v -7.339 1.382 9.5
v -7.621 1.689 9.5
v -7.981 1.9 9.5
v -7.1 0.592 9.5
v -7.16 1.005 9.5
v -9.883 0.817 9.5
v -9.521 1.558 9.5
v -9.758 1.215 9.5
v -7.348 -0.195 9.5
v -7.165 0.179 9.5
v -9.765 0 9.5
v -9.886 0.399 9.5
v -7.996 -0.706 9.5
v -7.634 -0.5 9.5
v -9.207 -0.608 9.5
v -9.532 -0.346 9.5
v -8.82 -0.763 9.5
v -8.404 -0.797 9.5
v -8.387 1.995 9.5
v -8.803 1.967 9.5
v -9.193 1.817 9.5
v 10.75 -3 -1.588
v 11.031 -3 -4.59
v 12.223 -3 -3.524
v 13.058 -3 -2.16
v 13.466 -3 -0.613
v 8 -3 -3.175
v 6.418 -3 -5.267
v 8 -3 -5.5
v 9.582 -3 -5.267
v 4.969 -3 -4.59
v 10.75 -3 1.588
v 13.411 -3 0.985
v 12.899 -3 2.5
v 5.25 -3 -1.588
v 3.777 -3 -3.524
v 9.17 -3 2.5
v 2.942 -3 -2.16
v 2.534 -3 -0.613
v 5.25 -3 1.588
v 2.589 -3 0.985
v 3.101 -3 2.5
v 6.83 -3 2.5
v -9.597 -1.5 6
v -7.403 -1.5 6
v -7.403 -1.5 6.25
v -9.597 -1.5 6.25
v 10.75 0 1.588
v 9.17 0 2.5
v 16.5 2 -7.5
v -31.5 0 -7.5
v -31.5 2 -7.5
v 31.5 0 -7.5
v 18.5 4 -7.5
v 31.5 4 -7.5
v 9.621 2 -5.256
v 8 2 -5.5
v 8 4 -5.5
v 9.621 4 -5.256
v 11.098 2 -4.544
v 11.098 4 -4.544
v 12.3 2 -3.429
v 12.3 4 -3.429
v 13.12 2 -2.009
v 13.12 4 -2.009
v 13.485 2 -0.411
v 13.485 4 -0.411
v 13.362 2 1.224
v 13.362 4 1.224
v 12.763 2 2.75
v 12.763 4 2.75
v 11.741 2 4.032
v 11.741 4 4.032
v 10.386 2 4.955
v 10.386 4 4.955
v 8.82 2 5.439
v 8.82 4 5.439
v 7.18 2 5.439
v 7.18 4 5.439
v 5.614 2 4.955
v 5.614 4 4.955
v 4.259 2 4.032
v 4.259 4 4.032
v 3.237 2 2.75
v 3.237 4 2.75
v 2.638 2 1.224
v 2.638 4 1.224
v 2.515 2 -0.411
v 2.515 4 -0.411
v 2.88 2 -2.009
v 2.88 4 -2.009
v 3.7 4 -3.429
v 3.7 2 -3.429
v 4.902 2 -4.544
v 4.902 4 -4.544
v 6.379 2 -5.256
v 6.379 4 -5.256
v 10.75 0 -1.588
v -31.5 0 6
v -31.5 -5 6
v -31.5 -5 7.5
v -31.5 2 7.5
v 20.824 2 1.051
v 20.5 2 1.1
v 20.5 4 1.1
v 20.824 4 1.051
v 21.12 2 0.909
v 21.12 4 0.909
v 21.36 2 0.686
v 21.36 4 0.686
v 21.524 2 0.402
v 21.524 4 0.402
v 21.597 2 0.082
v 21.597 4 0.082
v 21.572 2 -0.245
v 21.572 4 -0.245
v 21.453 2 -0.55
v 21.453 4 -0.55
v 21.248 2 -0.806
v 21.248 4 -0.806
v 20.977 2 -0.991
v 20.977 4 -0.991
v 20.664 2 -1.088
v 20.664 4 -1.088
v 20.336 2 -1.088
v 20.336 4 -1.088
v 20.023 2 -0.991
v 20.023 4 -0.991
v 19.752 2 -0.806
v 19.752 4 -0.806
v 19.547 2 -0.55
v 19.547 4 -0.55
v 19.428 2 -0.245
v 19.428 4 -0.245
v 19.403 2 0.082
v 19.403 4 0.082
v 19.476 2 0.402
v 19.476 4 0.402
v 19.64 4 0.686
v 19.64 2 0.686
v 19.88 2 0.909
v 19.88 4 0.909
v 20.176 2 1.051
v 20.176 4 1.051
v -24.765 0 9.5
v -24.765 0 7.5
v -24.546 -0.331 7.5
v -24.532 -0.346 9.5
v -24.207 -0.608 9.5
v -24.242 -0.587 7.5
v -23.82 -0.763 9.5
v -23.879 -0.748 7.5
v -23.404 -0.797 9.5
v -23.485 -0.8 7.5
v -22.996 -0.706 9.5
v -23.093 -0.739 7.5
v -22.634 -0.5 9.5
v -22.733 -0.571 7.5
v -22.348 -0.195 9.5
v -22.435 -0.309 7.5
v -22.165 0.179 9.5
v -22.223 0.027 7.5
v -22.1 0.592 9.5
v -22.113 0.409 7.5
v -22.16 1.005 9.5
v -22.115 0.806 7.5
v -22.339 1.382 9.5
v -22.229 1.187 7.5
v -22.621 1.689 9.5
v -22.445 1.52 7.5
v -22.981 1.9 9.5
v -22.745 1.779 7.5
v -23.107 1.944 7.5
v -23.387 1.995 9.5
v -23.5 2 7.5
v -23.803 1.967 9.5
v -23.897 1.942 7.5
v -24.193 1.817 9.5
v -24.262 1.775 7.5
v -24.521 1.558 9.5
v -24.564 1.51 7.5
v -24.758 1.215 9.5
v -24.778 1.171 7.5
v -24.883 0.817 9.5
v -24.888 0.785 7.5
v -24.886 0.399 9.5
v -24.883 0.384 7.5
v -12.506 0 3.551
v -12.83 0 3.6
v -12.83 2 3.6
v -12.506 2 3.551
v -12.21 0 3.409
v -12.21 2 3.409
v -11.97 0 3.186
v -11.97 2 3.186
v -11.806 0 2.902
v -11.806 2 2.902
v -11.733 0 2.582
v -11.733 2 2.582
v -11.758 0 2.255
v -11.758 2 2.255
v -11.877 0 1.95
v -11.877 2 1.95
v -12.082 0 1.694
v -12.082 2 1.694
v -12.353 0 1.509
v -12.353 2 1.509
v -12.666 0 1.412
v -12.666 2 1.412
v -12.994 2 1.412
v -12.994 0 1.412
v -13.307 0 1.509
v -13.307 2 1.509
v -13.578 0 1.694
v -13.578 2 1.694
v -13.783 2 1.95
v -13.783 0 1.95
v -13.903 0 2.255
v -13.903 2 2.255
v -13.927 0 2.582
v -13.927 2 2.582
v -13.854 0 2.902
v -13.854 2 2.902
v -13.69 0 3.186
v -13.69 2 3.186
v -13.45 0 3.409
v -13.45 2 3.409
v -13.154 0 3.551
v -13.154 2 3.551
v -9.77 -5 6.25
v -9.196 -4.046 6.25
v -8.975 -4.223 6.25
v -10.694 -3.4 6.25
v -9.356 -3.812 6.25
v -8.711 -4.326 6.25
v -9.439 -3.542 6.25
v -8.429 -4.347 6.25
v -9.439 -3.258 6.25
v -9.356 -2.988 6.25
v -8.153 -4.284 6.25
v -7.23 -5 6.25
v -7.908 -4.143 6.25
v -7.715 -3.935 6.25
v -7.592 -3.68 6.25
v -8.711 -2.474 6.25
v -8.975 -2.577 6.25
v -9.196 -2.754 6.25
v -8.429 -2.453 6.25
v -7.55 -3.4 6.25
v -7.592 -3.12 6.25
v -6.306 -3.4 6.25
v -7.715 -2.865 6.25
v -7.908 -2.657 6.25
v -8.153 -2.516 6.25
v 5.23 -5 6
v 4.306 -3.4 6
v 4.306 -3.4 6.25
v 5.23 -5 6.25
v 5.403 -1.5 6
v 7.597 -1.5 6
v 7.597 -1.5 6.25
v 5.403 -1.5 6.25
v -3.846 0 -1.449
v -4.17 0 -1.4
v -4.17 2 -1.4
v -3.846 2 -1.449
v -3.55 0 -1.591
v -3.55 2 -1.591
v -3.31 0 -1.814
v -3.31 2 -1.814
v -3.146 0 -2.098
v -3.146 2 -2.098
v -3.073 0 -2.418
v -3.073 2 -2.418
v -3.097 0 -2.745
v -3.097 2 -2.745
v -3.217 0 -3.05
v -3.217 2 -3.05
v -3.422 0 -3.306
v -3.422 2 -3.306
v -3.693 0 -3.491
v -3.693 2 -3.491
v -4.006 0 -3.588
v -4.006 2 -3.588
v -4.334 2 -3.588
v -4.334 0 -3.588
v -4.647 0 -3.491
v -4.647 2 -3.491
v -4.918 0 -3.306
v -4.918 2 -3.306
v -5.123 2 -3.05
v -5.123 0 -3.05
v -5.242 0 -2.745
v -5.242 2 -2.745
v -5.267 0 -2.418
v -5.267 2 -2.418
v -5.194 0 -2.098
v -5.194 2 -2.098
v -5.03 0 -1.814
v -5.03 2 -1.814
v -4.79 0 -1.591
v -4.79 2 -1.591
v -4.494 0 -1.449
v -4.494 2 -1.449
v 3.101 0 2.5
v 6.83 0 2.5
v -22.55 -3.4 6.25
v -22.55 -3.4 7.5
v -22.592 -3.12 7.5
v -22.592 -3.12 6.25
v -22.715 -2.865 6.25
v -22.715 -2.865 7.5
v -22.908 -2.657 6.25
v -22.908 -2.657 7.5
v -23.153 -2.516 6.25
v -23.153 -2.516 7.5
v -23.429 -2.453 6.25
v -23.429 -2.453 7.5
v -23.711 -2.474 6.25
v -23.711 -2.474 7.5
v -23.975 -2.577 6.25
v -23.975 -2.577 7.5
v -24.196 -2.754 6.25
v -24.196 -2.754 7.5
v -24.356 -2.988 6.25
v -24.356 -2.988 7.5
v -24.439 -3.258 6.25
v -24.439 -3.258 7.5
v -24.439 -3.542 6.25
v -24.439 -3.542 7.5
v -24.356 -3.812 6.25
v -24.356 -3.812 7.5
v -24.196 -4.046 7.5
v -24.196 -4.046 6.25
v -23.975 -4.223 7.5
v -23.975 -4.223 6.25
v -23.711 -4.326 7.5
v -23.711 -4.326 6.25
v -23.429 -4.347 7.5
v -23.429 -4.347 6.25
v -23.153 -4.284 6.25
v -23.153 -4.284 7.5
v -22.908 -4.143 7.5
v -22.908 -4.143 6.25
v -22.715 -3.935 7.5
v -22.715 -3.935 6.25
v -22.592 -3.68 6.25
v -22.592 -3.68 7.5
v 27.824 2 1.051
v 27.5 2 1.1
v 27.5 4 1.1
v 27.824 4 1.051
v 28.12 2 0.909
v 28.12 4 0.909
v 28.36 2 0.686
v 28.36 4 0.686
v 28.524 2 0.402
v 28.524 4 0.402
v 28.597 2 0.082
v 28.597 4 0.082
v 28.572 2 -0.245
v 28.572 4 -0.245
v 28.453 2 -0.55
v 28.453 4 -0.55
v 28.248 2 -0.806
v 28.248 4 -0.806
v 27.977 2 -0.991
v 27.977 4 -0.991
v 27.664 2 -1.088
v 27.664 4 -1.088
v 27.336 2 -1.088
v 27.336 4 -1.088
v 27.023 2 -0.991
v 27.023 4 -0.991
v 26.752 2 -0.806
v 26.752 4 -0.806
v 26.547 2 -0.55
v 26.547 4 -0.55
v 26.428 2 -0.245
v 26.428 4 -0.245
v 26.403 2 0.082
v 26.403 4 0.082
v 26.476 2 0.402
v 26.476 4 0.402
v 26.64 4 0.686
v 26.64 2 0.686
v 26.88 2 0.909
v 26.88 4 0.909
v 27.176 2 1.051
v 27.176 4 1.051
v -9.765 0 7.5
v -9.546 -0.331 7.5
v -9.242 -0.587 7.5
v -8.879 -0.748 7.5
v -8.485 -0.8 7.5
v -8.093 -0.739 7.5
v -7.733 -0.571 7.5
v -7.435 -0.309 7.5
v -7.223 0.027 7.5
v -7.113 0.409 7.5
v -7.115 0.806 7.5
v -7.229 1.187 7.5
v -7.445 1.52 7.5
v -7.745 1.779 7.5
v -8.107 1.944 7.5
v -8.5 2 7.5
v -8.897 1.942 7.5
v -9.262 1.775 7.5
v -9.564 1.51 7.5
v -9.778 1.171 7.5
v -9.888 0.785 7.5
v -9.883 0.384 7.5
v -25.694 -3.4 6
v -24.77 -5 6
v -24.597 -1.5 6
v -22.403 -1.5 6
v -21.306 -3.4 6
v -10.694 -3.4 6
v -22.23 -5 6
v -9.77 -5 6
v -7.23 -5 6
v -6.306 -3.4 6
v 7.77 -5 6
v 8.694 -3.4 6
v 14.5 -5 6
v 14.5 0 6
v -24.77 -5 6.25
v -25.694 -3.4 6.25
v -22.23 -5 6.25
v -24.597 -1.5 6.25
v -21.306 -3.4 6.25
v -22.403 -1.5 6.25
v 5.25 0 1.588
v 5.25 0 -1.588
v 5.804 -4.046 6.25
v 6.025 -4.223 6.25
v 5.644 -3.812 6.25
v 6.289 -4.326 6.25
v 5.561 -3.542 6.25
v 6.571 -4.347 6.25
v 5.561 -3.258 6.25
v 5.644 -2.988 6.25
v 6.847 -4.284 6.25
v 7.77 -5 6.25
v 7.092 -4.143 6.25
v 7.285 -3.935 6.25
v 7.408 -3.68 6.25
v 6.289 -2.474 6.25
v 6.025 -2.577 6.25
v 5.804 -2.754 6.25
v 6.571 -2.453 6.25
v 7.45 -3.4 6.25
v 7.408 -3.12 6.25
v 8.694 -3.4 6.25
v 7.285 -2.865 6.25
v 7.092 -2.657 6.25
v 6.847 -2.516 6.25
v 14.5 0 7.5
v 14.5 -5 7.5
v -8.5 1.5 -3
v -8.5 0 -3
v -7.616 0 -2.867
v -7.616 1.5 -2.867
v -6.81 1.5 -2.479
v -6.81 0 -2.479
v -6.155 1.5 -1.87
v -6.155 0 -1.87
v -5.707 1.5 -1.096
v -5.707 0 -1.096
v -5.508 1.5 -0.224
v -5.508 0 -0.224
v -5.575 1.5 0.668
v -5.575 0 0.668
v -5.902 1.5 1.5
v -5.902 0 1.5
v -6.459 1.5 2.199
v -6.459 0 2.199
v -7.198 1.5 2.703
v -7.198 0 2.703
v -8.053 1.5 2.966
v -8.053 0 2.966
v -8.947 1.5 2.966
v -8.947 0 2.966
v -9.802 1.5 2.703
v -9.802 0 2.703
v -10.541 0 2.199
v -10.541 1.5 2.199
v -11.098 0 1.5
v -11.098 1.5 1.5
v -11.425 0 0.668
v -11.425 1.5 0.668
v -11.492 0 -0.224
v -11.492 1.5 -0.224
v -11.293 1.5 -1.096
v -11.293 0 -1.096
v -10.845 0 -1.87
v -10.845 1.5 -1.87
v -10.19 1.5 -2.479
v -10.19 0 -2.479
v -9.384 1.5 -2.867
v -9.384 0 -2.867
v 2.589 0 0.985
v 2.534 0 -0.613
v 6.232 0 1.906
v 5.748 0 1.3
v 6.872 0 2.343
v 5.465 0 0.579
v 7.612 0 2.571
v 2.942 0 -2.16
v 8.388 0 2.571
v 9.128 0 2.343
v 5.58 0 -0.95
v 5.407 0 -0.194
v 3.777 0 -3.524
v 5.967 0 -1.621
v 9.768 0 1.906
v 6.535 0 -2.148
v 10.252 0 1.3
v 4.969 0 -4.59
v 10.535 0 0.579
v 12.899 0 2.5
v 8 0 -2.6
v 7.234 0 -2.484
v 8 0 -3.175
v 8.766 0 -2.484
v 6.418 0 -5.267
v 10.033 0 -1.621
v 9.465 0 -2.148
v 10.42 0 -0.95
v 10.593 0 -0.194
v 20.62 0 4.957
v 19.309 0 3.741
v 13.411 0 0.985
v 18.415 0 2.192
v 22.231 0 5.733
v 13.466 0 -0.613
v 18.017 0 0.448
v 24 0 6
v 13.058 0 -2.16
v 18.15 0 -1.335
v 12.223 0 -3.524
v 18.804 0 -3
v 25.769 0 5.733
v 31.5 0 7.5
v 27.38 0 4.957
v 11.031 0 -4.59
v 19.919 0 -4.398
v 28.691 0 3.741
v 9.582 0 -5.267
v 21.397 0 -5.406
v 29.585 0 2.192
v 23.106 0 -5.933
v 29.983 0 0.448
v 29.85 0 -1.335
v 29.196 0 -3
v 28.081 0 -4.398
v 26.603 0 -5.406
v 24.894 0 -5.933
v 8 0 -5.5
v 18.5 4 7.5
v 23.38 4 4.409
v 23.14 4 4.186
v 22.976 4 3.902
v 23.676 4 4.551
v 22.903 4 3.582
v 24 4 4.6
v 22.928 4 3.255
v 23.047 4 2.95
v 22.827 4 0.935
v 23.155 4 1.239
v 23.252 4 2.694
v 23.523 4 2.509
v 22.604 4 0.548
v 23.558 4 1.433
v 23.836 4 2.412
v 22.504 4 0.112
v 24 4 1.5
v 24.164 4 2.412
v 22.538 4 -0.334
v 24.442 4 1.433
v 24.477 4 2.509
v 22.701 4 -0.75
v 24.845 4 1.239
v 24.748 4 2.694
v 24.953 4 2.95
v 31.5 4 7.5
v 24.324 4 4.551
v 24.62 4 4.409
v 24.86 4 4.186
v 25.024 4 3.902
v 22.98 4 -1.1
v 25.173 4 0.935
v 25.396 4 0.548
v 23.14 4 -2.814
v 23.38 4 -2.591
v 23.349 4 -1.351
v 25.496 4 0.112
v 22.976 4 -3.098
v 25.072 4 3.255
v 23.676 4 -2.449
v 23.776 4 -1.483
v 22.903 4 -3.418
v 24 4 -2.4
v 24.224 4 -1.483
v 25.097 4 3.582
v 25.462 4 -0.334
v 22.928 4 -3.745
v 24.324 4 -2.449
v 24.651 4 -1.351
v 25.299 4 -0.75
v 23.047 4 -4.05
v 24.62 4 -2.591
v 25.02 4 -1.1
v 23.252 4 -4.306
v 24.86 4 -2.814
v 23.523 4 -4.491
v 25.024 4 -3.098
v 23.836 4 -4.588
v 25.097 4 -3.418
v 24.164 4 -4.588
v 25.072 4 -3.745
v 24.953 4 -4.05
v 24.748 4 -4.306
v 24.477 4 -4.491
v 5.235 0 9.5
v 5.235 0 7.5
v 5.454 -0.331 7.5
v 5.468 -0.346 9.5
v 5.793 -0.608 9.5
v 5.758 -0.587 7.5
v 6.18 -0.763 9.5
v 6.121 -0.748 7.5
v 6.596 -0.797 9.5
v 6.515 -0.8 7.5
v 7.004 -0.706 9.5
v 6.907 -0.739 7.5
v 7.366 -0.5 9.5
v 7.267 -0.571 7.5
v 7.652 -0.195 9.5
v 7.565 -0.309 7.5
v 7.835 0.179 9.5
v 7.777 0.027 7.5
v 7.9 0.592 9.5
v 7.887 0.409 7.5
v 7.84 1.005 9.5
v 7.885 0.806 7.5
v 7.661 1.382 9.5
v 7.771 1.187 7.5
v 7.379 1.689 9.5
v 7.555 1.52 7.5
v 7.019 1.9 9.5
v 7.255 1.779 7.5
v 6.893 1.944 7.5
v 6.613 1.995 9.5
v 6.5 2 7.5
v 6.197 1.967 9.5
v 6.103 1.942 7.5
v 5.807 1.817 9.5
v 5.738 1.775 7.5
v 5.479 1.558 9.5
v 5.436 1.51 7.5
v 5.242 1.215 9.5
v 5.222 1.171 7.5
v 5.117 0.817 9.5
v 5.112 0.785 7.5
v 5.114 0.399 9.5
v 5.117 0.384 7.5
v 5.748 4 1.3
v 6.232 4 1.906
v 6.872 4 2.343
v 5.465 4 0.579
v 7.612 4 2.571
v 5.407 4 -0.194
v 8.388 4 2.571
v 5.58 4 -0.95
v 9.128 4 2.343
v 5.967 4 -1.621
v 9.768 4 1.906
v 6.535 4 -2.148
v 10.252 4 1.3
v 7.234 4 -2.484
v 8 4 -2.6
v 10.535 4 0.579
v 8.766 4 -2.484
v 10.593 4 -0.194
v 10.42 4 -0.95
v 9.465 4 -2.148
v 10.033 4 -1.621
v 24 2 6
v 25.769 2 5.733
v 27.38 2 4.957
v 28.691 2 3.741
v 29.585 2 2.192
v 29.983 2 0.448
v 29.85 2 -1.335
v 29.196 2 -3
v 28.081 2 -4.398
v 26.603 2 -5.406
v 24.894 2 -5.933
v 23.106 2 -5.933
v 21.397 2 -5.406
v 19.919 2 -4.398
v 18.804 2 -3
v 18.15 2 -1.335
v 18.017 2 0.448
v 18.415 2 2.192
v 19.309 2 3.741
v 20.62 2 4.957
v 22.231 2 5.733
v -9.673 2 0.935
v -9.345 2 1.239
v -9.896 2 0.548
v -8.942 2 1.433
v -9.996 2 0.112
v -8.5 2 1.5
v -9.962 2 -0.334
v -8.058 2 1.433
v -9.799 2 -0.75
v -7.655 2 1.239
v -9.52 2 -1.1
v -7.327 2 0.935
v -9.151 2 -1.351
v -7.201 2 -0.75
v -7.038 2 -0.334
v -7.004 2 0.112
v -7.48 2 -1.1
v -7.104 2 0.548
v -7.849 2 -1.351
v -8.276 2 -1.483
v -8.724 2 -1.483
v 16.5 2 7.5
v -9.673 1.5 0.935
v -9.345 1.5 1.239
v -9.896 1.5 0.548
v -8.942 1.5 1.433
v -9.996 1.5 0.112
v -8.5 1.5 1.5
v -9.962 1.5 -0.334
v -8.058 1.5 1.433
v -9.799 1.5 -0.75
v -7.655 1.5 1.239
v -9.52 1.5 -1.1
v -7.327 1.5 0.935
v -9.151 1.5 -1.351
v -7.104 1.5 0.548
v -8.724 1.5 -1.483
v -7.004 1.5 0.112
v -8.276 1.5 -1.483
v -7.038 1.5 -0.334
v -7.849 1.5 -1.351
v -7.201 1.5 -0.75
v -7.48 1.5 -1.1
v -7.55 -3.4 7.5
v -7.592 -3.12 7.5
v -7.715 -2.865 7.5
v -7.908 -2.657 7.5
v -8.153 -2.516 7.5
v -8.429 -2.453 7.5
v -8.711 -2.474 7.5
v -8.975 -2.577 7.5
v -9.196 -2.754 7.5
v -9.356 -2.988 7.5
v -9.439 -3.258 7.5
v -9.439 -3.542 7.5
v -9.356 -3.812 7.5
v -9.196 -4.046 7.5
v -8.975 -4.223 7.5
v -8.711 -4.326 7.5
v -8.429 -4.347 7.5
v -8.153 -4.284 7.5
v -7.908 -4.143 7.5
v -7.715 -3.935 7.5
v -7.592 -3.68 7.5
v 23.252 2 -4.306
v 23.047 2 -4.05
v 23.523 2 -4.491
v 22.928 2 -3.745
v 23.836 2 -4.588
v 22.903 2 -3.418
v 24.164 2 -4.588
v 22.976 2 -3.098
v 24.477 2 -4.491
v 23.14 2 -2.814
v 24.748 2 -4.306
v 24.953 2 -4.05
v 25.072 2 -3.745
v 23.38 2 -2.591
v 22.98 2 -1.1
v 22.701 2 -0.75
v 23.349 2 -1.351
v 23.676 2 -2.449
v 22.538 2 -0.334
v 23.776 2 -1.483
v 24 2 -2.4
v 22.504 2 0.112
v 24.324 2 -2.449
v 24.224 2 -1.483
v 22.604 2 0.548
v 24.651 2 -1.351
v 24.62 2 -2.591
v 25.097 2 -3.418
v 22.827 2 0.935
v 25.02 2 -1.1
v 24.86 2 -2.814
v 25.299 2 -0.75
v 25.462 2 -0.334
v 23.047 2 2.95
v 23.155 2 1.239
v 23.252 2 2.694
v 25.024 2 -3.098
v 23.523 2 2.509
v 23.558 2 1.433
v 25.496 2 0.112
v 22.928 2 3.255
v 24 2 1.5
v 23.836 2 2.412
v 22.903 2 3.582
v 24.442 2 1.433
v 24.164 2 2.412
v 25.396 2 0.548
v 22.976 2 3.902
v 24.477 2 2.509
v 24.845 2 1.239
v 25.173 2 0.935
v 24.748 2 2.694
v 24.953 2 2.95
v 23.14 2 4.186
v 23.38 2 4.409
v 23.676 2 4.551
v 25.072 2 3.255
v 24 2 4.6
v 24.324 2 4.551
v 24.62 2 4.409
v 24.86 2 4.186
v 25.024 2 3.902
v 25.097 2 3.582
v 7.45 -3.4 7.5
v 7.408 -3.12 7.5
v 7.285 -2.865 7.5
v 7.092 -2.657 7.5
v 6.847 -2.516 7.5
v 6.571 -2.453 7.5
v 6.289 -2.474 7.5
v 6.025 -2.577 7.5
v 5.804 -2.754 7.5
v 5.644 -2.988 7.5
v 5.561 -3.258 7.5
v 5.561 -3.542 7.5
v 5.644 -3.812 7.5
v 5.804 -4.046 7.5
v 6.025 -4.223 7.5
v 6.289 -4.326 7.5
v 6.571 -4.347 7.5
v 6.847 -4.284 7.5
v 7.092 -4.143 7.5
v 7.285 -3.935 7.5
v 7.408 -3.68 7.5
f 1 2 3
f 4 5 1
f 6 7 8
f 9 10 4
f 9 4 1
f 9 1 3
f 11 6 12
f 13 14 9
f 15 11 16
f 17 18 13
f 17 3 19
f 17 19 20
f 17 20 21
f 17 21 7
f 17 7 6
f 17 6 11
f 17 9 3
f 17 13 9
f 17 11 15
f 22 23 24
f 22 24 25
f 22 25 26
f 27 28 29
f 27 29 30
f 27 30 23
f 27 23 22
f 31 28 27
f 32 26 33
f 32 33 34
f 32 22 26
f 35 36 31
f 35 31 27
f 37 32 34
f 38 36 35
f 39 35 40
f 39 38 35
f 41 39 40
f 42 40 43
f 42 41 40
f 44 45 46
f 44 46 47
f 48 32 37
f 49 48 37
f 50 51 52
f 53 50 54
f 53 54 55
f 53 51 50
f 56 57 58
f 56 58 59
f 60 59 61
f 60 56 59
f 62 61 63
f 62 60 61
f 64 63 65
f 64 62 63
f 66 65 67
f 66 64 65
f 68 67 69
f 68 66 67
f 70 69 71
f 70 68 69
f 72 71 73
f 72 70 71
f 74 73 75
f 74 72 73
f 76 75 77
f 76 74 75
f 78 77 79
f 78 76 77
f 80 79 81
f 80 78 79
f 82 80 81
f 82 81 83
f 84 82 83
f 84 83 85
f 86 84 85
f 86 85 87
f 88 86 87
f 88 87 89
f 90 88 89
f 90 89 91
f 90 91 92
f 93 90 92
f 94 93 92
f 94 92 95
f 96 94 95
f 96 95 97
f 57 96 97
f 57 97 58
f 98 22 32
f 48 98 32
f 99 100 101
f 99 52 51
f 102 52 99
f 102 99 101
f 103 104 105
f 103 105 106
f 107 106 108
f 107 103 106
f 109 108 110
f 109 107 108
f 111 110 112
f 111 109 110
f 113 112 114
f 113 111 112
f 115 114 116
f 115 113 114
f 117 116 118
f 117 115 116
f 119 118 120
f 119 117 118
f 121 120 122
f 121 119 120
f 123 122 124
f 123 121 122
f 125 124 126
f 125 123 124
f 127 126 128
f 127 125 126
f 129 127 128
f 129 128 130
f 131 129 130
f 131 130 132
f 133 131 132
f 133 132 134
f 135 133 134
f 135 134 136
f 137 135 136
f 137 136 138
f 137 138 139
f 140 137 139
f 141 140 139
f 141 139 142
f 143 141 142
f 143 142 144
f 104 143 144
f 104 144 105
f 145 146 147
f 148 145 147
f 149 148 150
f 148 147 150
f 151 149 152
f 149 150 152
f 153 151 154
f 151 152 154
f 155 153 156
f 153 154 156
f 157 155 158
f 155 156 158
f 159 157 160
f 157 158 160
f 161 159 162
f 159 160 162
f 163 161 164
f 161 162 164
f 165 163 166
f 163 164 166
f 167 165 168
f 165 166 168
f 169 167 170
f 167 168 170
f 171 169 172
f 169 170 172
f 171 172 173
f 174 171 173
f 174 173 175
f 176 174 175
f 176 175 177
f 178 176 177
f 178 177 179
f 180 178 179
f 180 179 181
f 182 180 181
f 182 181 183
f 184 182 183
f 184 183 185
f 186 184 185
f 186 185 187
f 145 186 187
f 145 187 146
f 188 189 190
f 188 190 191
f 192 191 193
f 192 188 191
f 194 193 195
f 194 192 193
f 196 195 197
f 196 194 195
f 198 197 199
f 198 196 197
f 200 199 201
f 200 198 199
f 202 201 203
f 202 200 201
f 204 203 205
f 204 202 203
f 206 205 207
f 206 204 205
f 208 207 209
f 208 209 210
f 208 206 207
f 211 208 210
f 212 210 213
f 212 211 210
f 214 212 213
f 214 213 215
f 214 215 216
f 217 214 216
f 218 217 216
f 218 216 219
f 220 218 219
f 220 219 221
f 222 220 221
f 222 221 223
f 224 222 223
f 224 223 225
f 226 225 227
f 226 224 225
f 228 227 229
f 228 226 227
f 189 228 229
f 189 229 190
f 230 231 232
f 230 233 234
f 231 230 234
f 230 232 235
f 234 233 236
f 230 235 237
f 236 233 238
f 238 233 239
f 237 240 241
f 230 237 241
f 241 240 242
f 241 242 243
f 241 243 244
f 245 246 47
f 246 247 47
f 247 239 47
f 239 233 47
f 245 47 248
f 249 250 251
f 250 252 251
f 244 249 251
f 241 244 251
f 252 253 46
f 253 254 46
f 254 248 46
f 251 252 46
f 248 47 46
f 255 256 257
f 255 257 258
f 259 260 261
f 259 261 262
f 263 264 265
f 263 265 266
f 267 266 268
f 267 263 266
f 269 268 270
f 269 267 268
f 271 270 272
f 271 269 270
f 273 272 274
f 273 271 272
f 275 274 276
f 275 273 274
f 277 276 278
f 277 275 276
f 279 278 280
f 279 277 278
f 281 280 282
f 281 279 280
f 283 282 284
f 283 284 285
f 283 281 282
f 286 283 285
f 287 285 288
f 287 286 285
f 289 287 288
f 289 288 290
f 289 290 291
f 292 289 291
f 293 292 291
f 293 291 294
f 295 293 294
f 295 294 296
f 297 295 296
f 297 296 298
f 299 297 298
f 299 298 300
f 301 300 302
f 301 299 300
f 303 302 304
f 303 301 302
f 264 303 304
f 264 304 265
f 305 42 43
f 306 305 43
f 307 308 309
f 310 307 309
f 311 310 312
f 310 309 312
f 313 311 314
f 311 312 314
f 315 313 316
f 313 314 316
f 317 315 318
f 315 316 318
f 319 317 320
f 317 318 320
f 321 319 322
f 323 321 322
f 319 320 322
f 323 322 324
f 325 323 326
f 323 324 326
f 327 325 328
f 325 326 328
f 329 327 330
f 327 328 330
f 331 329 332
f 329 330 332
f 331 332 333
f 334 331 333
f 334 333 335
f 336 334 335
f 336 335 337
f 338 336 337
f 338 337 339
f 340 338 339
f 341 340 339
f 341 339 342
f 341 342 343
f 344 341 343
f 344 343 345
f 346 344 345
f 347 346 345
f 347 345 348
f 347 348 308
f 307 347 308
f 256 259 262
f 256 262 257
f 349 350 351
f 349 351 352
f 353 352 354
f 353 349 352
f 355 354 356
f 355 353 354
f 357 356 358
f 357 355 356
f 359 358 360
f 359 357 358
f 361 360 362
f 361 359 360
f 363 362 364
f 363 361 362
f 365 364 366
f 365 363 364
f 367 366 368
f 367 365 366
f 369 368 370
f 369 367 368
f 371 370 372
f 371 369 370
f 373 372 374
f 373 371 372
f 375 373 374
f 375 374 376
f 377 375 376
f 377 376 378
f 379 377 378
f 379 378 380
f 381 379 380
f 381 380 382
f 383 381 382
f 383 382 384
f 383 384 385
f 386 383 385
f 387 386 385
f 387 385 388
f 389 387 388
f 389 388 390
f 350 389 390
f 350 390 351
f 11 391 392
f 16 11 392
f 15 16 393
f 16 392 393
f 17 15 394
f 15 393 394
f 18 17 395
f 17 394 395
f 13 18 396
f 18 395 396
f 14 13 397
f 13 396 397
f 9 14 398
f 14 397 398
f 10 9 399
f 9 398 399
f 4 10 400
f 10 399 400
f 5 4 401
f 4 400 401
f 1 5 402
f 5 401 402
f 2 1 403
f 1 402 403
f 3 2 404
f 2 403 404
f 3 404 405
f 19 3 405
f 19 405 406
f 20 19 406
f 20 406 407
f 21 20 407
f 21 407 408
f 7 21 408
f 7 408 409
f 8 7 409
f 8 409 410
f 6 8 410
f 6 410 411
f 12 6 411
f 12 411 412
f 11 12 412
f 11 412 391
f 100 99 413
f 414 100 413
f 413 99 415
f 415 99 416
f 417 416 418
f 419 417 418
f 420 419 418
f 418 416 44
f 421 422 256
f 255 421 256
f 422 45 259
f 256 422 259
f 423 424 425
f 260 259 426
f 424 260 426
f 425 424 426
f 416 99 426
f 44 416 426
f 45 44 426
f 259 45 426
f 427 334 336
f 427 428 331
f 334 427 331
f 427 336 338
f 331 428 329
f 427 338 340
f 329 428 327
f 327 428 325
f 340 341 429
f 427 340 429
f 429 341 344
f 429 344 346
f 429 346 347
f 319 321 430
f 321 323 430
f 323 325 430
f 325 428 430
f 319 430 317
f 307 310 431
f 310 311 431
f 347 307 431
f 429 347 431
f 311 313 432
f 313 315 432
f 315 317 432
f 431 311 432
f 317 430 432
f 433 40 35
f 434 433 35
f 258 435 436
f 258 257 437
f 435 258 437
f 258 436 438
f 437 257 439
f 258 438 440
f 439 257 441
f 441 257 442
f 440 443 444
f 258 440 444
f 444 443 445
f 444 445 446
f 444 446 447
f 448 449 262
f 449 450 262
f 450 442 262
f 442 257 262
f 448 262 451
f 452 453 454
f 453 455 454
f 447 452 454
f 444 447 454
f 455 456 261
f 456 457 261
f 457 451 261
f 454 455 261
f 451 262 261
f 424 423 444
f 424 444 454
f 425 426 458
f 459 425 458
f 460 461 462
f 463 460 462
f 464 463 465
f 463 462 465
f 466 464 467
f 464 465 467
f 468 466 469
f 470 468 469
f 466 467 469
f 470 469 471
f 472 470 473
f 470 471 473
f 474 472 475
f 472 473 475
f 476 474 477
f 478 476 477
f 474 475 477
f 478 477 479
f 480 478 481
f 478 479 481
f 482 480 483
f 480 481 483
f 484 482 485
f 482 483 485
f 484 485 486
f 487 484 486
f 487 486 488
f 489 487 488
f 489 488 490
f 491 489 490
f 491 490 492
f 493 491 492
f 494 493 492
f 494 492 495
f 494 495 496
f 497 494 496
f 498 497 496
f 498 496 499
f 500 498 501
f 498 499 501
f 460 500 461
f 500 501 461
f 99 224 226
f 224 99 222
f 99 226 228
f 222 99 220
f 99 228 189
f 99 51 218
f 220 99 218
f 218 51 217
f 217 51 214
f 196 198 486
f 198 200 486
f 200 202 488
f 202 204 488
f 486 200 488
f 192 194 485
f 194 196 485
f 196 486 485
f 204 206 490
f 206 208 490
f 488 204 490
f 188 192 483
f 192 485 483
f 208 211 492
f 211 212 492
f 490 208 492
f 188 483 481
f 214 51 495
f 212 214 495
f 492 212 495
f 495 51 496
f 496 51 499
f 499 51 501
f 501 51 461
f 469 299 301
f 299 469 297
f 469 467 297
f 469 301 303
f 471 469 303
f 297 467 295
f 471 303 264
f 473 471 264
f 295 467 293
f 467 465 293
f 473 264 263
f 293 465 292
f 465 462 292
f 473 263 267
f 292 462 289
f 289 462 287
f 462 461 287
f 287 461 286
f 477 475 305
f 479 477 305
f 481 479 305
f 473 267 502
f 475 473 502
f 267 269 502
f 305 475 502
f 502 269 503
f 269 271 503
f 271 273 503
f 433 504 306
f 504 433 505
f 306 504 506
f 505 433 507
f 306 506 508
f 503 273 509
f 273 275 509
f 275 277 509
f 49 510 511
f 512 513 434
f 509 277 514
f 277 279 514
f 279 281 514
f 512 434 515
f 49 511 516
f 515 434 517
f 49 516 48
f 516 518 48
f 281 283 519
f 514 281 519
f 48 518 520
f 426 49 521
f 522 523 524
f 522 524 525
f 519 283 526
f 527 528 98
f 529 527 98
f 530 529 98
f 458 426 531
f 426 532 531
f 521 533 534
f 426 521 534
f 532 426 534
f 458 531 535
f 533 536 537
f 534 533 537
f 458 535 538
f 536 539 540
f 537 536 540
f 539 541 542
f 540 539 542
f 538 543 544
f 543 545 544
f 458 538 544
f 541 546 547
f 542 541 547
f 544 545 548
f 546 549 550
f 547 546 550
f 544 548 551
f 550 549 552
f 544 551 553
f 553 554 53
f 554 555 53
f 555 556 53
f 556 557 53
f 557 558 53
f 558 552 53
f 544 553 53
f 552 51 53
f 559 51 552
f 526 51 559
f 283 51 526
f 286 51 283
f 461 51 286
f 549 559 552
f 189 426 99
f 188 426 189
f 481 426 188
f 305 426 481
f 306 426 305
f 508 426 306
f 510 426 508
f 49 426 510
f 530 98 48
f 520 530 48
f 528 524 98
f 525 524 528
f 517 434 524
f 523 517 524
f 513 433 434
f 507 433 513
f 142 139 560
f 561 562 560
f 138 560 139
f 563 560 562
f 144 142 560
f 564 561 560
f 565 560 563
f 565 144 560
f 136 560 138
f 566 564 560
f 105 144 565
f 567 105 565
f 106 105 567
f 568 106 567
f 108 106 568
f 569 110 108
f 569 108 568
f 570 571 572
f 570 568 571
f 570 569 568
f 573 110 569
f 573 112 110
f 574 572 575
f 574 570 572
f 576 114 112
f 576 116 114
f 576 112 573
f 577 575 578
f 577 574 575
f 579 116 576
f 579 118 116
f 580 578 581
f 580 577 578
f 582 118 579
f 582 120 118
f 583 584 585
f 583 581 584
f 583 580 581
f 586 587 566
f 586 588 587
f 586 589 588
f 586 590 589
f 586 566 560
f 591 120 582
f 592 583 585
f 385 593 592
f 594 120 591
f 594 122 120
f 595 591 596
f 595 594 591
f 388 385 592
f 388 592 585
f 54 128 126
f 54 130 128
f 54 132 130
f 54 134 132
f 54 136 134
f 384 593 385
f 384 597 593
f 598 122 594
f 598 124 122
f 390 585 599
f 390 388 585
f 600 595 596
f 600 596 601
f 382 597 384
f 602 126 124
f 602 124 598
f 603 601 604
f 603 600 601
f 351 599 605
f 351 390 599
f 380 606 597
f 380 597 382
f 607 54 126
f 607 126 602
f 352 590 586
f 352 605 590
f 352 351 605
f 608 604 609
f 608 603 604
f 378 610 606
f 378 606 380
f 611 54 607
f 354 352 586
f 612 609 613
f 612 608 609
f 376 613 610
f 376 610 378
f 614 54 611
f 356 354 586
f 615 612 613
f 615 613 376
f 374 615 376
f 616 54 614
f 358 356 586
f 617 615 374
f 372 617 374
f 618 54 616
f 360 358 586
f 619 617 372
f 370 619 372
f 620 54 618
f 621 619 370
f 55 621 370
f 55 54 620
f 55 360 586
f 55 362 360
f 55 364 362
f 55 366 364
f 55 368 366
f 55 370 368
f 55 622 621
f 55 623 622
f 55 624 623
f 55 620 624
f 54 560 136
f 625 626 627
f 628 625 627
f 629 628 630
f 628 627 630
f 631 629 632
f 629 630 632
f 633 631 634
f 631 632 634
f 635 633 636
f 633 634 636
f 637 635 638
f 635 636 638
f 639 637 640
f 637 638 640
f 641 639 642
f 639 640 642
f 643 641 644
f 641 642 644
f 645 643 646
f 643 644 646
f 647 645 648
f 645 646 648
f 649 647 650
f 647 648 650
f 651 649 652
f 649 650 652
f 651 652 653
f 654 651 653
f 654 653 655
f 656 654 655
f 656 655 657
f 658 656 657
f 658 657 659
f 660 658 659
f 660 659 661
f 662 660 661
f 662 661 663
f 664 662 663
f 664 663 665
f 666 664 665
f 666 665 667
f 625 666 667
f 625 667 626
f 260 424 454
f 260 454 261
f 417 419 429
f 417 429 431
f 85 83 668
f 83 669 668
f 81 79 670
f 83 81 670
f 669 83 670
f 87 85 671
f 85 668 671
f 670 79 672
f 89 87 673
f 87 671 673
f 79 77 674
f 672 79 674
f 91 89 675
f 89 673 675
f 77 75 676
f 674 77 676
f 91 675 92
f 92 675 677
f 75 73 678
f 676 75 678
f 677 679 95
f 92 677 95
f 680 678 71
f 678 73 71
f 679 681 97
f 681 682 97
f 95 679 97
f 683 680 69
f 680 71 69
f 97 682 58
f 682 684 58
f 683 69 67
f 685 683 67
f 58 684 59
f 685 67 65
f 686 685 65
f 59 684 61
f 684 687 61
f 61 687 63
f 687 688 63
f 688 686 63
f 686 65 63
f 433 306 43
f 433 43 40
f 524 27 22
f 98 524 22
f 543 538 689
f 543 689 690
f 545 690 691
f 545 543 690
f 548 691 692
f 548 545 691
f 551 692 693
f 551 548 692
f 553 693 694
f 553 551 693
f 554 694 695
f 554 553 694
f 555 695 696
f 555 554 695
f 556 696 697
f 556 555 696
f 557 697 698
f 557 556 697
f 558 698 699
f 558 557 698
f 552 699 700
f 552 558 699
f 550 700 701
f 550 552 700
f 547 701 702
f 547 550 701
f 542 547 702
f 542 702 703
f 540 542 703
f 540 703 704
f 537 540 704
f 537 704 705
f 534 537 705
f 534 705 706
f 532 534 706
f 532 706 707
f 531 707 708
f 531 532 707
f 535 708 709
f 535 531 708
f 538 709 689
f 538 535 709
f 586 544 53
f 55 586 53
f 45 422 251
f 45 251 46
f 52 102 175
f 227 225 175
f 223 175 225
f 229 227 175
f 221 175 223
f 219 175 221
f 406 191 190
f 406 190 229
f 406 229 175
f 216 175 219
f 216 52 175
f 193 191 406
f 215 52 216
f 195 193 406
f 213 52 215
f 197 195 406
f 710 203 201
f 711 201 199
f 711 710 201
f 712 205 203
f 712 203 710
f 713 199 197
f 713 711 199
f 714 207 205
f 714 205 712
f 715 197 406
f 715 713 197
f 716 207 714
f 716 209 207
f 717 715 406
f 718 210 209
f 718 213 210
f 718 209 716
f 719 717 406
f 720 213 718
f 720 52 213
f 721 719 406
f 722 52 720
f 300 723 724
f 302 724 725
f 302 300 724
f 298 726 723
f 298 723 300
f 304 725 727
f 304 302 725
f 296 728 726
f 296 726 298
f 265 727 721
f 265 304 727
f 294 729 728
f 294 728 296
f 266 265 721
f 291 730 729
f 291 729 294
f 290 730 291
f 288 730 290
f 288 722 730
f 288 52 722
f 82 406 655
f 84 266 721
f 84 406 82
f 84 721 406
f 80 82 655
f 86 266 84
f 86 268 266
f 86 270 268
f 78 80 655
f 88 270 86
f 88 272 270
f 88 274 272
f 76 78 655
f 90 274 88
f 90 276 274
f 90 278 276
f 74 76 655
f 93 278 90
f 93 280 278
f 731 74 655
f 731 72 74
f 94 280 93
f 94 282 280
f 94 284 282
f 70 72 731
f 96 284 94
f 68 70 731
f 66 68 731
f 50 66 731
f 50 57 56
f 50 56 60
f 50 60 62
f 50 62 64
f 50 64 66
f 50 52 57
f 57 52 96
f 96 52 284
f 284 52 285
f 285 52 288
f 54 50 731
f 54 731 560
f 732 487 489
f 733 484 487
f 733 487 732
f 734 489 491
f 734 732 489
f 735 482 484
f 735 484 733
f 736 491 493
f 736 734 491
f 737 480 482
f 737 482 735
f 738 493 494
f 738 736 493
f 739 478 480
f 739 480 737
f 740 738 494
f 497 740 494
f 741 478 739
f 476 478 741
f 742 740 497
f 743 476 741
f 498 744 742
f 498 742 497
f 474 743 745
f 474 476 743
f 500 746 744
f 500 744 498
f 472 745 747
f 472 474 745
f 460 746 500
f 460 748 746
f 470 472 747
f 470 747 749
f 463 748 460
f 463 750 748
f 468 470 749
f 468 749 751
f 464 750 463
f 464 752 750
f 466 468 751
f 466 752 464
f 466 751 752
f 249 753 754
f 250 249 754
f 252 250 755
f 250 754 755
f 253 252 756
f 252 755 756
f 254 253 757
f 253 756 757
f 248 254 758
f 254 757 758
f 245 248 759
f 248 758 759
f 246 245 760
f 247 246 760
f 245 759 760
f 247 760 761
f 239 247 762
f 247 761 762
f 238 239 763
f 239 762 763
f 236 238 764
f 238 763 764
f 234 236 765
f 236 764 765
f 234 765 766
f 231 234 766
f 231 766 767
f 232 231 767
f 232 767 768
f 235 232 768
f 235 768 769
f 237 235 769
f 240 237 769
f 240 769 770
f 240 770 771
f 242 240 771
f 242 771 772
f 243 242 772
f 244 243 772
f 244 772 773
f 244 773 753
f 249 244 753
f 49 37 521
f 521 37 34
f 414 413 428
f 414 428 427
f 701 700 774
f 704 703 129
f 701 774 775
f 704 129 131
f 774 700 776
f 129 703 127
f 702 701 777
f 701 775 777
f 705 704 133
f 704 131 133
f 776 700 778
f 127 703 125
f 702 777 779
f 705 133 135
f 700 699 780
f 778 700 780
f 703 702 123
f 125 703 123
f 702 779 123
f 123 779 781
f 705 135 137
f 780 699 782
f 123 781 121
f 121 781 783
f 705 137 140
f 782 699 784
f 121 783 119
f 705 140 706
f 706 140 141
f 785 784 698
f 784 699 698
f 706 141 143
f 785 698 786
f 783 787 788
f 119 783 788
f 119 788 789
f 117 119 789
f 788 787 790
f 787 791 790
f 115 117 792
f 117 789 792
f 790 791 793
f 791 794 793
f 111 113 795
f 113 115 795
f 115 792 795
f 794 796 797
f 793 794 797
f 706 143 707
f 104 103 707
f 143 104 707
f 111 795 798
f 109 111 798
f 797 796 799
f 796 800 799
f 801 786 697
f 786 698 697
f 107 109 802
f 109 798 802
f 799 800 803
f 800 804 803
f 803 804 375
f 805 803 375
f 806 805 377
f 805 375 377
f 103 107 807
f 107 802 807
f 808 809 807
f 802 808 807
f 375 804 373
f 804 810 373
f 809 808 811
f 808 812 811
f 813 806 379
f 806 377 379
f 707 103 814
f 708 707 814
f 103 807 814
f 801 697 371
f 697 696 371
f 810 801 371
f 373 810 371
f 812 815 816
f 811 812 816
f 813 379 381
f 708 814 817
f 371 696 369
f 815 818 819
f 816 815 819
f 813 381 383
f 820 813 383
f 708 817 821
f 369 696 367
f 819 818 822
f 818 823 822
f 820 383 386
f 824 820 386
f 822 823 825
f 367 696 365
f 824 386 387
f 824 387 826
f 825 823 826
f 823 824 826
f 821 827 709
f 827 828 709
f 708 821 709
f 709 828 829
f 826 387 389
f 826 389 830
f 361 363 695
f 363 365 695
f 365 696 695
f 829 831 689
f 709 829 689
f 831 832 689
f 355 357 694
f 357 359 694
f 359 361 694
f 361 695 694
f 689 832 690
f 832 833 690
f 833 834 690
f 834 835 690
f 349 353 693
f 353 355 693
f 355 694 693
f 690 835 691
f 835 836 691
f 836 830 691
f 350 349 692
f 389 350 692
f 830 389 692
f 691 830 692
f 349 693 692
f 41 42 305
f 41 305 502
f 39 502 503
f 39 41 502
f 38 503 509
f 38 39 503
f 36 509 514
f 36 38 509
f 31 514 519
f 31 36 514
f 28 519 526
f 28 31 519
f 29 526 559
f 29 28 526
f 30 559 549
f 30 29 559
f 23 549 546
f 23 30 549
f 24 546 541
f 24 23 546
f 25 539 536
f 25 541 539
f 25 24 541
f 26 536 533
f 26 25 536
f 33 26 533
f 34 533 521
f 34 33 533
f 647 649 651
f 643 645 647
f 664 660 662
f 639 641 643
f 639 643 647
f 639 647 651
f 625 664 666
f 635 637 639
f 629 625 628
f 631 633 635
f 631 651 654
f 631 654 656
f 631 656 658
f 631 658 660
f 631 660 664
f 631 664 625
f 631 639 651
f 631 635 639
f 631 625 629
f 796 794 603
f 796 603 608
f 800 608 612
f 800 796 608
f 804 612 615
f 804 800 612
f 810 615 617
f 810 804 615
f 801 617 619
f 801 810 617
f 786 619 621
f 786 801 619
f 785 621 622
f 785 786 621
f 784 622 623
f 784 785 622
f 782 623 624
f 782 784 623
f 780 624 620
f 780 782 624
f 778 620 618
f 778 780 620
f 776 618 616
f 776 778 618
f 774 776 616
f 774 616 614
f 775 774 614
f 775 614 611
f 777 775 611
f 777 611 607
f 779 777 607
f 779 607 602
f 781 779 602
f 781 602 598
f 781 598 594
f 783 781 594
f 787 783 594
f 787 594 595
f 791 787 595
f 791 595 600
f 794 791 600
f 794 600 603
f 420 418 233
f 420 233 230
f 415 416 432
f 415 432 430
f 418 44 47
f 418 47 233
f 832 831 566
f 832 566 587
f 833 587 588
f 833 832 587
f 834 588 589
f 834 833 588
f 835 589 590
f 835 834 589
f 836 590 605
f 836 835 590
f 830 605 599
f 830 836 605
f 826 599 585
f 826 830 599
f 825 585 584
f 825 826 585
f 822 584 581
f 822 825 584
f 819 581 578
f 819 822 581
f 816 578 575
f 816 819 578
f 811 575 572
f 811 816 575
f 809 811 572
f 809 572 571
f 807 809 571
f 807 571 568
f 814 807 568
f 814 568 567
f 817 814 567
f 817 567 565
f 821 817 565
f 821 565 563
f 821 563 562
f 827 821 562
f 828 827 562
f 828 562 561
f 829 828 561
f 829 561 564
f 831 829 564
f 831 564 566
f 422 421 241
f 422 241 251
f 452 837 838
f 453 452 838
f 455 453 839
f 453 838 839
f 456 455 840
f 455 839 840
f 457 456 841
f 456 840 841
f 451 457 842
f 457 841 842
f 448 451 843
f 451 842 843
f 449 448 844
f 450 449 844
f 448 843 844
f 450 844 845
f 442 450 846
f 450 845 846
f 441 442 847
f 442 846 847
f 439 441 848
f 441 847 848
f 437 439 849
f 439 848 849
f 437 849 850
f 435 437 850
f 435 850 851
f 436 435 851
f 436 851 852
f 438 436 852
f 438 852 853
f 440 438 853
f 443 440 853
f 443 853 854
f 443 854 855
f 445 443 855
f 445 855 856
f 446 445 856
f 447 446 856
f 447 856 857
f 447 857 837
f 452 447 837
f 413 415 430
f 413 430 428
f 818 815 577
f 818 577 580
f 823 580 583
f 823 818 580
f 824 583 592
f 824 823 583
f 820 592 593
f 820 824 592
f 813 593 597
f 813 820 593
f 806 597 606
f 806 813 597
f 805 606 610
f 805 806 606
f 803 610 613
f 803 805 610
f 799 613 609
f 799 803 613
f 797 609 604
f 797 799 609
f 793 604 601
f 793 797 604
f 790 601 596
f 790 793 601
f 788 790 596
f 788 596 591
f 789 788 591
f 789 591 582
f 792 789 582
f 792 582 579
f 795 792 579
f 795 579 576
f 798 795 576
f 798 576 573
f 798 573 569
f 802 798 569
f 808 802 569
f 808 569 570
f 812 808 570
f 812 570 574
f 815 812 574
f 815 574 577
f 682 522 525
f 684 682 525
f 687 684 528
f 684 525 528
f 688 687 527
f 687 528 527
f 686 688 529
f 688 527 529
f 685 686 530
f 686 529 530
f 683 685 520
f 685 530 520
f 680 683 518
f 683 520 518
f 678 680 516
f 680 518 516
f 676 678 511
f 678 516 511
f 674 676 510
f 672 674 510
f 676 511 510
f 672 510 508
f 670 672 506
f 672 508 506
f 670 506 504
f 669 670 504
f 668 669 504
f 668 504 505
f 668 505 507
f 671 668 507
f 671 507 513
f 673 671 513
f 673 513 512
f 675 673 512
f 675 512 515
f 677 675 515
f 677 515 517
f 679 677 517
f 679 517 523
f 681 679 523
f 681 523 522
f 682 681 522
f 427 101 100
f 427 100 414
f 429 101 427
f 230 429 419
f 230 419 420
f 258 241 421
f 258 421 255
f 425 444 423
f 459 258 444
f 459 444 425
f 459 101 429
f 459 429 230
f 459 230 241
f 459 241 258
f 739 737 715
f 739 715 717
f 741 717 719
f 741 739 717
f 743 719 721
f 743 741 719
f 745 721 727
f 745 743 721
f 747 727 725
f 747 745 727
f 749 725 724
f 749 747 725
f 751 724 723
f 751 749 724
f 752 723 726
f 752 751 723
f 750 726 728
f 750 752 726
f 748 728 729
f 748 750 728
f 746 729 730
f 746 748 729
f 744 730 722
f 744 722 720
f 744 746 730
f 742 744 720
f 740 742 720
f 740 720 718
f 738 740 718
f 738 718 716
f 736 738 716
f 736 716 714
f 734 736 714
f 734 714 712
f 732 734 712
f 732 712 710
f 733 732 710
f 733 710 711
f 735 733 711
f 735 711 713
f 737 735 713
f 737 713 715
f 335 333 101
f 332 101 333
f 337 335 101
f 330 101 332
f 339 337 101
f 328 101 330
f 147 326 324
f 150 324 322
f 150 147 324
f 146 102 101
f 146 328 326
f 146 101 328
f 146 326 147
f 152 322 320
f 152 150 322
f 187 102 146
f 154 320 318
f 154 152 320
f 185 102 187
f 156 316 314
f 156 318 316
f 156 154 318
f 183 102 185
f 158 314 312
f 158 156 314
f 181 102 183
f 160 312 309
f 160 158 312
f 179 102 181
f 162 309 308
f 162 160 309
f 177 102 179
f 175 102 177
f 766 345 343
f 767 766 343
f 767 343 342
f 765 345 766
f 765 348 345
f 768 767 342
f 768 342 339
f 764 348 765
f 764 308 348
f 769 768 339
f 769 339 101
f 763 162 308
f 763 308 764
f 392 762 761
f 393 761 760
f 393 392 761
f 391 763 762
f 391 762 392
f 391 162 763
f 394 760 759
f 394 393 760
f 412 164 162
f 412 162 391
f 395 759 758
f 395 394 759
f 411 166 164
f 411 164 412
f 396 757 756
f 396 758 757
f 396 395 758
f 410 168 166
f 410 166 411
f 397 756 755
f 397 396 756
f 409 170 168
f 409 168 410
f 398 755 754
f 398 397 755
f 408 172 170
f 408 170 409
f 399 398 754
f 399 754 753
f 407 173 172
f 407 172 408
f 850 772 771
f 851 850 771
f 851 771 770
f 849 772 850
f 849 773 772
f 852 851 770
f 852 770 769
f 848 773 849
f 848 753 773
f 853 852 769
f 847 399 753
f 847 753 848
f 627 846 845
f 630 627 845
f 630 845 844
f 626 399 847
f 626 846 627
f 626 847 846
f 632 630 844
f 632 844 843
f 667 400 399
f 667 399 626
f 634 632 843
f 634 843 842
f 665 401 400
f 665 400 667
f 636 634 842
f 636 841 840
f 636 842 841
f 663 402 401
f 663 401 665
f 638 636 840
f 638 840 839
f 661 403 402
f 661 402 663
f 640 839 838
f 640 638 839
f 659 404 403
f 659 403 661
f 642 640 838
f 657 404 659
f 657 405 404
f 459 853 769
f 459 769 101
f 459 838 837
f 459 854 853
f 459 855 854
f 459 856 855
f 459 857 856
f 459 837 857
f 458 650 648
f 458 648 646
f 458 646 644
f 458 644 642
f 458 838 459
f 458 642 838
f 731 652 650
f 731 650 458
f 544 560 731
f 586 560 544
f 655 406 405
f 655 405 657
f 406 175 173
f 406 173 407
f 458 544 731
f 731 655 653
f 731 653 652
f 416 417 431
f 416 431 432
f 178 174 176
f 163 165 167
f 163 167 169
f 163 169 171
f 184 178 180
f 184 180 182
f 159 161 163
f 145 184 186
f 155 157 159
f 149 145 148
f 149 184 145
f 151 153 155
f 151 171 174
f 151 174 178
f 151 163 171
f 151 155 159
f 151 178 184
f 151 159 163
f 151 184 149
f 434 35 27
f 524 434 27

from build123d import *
from build123d.topology import SkipClean

# Parameters (mm, degrees)
SKETCH_1_W          = 63
SKETCH_1_H          = 15
SKETCH_1_R          = 1.5
SKETCH_1_R_2        = 1.1
SKETCH_1_R_3        = 2.6
EXTRUDE_1_DEPTH     = 2
SKETCH_2_R          = 1.4
EXTRUDE_2_DEPTH     = 2
SKETCH_3_R          = 3
CUT_EXTRUDE_1_DEPTH = 1.5
SKETCH_4_W          = 46
SKETCH_4_H          = 1.5
EXTRUDE_3_DEPTH     = 5
SKETCH_2_3_R        = 0.95
CUT_EXTRUDE_2_DEPTH = 1.5
CUT_EXTRUDE_3_DEPTH = 0.25
SKETCH_1_7_W        = 15
SKETCH_1_7_H        = 15
SKETCH_1_7_R        = 1.5
SKETCH_1_7_R_2      = 1.1
EXTRUDE_4_DEPTH     = 4
SKETCH_1_8_R        = 6
SKETCH_1_8_R_2      = 1.5
SKETCH_1_8_R_3      = 1.1
CUT_EXTRUDE_4_DEPTH = 2
CUT_EXTRUDE_5_DEPTH = 15
EXTRUDE_START       = 3
SKETCH_8_R          = 5.5
SKETCH_8_R_2        = 2.6
EXTRUDE_11_DEPTH    = 3
CUT_EXTRUDE_6_DEPTH = 3.5
CUT_EXTRUDE_7_DEPTH = 3
SKETCH_8_2_R        = 5.5
SKETCH_8_2_R_2      = 2.6
EXTRUDE_12_DEPTH    = 4


with BuildPart() as part:
    # 草图1 → 凸台-拉伸1 (new body)
    with BuildSketch(Plane(origin=(0, 0, 0), x_dir=(1, 0, 0), z_dir=(0, 1, 0))):
        Rectangle(SKETCH_1_W, SKETCH_1_H)
        with Locations(Location((-8.5, 0, 0), (0, 0, 270))):
            Circle(SKETCH_1_R, mode=Mode.SUBTRACT)
        with Locations(Location((-4.169872981, 2.5, 0), (0, 0, 270))):
            Circle(SKETCH_1_R_2, mode=Mode.SUBTRACT)
        with Locations(Location((-12.830127019, -2.5, 0), (0, 0, 270))):
            Circle(SKETCH_1_R_2, mode=Mode.SUBTRACT)
        with Locations(Location((8, 0, 0), (0, 0, 270))):
            Circle(SKETCH_1_R_3, mode=Mode.SUBTRACT)
        with Locations(Location((24, 0, 0), (0, 0, 270))):
            Circle(SKETCH_1_R, mode=Mode.SUBTRACT)
        with Locations(Location((27.5, 0, 0), (0, 0, 270))):
            Circle(SKETCH_1_R_2, mode=Mode.SUBTRACT)
        with Locations(Location((24, -3.5, 0), (0, 0, 270))):
            Circle(SKETCH_1_R_2, mode=Mode.SUBTRACT)
        with Locations(Location((20.5, 0, 0), (0, 0, 270))):
            Circle(SKETCH_1_R_2, mode=Mode.SUBTRACT)
        with Locations(Location((24, 3.5, 0), (0, 0, 270))):
            Circle(SKETCH_1_R_2, mode=Mode.SUBTRACT)
    extrude(amount=EXTRUDE_1_DEPTH)

    # 草图2 → 凸台-拉伸2 (add)
    with BuildSketch(Plane.XY.offset(7.5)):
        with Locations(Location((-23.5, 0.6, 0), (0, 0, 205.376933525))):
            Circle(SKETCH_2_R)
        with Locations(Location((-8.5, 0.6, 0), (0, 0, 205.376933525))):
            Circle(SKETCH_2_R)
        with Locations(Location((6.5, 0.6, 0), (0, 0, 205.376933525))):
            Circle(SKETCH_2_R)
    extrude(amount=EXTRUDE_2_DEPTH)

    # 草图3 → 切除-拉伸1 (cut)
    with BuildSketch(Plane.XZ):
        with Locations(Location((-8.5, 0, 0), (0, 0, 270))):
            Circle(SKETCH_3_R)
    extrude(amount=-CUT_EXTRUDE_1_DEPTH, mode=Mode.SUBTRACT)

    # 草图4 → 凸台-拉伸3 (add)
    with BuildSketch(Plane.XZ):
        with Locations((-8.5, 6.75)):
            Rectangle(SKETCH_4_W, SKETCH_4_H)
    extrude(amount=EXTRUDE_3_DEPTH)

    # 草图2<3> → 切除-拉伸2 (cut)
    with BuildSketch(Plane.XY.offset(7.5)):
        with Locations((-23.5, -3.4)):
            Circle(SKETCH_2_3_R)
        with Locations((-8.5, -3.4)):
            Circle(SKETCH_2_3_R)
        with Locations((6.5, -3.4)):
            Circle(SKETCH_2_3_R)
    extrude(amount=-CUT_EXTRUDE_2_DEPTH, mode=Mode.SUBTRACT)

    # 草图5 → 切除-拉伸3 (cut)
    with BuildSketch(Plane(origin=(0, 0, 6), x_dir=(-1, 0, 0), z_dir=(0, 0, -1))):
        Polygon((22.403034489, -1.5), (24.596965511, -1.5), (25.693931023, -3.4), (24.596965511, -5.3), (22.403034489, -5.3), (21.306068977, -3.4), align=None)
        Polygon((6.306068977, -3.4), (7.403034489, -1.5), (9.596965511, -1.5), (10.693931023, -3.4), (9.596965511, -5.3), (7.403034489, -5.3), align=None)
        Polygon((-8.693931023, -3.4), (-7.596965511, -1.5), (-5.403034489, -1.5), (-4.306068977, -3.4), (-5.403034489, -5.3), (-7.596965511, -5.3), align=None)
    extrude(amount=-CUT_EXTRUDE_3_DEPTH, mode=Mode.SUBTRACT)

    # 草图1<7> → 凸台-拉伸4 (add)
    with SkipClean():  # the faces are left unmerged after this step: merging them gives an invalid solid
        with BuildSketch(Plane(origin=(0, 0, 0), x_dir=(1, 0, 0), z_dir=(0, 1, 0))):
            with Locations((24, 0)):
                Rectangle(SKETCH_1_7_W, SKETCH_1_7_H)
            with Locations(Location((24, 0, 0), (0, 0, 270))):
                Circle(SKETCH_1_7_R, mode=Mode.SUBTRACT)
            with Locations(Location((27.5, 0, 0), (0, 0, 270))):
                Circle(SKETCH_1_7_R_2, mode=Mode.SUBTRACT)
            with Locations(Location((24, -3.5, 0), (0, 0, 270))):
                Circle(SKETCH_1_7_R_2, mode=Mode.SUBTRACT)
            with Locations(Location((20.5, 0, 0), (0, 0, 270))):
                Circle(SKETCH_1_7_R_2, mode=Mode.SUBTRACT)
            with Locations(Location((24, 3.5, 0), (0, 0, 270))):
                Circle(SKETCH_1_7_R_2, mode=Mode.SUBTRACT)
        extrude(amount=EXTRUDE_4_DEPTH)

    # 草图1<8> → 切除-拉伸4 (cut)
    with SkipClean():  # the faces are left unmerged after this step: merging them gives an invalid solid
        with BuildSketch(Plane(origin=(0, 0, 0), x_dir=(1, 0, 0), z_dir=(0, 1, 0))):
            with Locations(Location((24, 0, 0), (0, 0, 270))):
                Circle(SKETCH_1_8_R)
            with Locations(Location((24, 0, 0), (0, 0, 270))):
                Circle(SKETCH_1_8_R_2, mode=Mode.SUBTRACT)
            with Locations(Location((27.5, 0, 0), (0, 0, 270))):
                Circle(SKETCH_1_8_R_3, mode=Mode.SUBTRACT)
            with Locations(Location((24, -3.5, 0), (0, 0, 270))):
                Circle(SKETCH_1_8_R_3, mode=Mode.SUBTRACT)
            with Locations(Location((20.5, 0, 0), (0, 0, 270))):
                Circle(SKETCH_1_8_R_3, mode=Mode.SUBTRACT)
            with Locations(Location((24, 3.5, 0), (0, 0, 270))):
                Circle(SKETCH_1_8_R_3, mode=Mode.SUBTRACT)
        extrude(amount=CUT_EXTRUDE_4_DEPTH, mode=Mode.SUBTRACT)

    # 草图6 → 切除-拉伸5 (cut)
    with BuildSketch(Plane(origin=(0, 0, -7.5), x_dir=(-1, 0, 0), z_dir=(0, 0, -1))):
        Polygon((-16.5, 2), (-18.5, 4), (-16.5, 4), align=None)
    extrude(amount=-CUT_EXTRUDE_5_DEPTH, mode=Mode.SUBTRACT)

    # 草图8 → 凸台-拉伸11 (add)
    with SkipClean():  # the faces are left unmerged after this step: merging them gives an invalid solid
        with BuildSketch(Plane.XZ.offset(EXTRUDE_START)):
            with Locations(Location((8, 0, 0), (0, 0, 90))):
                Circle(SKETCH_8_R)
            with Locations(Location((8, 0, 0), (0, 0, 270))):
                Circle(SKETCH_8_R_2, mode=Mode.SUBTRACT)
        extrude(amount=-EXTRUDE_11_DEPTH)

    # 草图10 → 切除-拉伸6 (cut)
    with BuildSketch(Plane.XZ.offset(3)):
        Polygon((8, 3.175426481), (5.25, 1.58771324), (5.25, -1.58771324), (8, -3.175426481), (10.75, -1.58771324), (10.75, 1.58771324), align=None)
    extrude(amount=-CUT_EXTRUDE_6_DEPTH, mode=Mode.SUBTRACT)

    # 草图11 → 切除-拉伸7 (cut)
    with BuildSketch(Plane.XZ.offset(3)):
        with BuildLine():
            Line((3.101020514, 2.5), (12.898979486, 2.5))
            ThreePointArc((12.898979486, 2.5), (8, 5.5), (3.101020514, 2.5))
        make_face()
    extrude(amount=-CUT_EXTRUDE_7_DEPTH, mode=Mode.SUBTRACT)

    # 草图8<2> → 凸台-拉伸12 (add)
    with BuildSketch(Plane.XZ):
        with Locations(Location((8, 0, 0), (0, 0, 270))):
            Circle(SKETCH_8_2_R)
        with Locations(Location((8, 0, 0), (0, 0, 270))):
            Circle(SKETCH_8_2_R_2, mode=Mode.SUBTRACT)
    extrude(amount=-EXTRUDE_12_DEPTH)


solid = part.part
